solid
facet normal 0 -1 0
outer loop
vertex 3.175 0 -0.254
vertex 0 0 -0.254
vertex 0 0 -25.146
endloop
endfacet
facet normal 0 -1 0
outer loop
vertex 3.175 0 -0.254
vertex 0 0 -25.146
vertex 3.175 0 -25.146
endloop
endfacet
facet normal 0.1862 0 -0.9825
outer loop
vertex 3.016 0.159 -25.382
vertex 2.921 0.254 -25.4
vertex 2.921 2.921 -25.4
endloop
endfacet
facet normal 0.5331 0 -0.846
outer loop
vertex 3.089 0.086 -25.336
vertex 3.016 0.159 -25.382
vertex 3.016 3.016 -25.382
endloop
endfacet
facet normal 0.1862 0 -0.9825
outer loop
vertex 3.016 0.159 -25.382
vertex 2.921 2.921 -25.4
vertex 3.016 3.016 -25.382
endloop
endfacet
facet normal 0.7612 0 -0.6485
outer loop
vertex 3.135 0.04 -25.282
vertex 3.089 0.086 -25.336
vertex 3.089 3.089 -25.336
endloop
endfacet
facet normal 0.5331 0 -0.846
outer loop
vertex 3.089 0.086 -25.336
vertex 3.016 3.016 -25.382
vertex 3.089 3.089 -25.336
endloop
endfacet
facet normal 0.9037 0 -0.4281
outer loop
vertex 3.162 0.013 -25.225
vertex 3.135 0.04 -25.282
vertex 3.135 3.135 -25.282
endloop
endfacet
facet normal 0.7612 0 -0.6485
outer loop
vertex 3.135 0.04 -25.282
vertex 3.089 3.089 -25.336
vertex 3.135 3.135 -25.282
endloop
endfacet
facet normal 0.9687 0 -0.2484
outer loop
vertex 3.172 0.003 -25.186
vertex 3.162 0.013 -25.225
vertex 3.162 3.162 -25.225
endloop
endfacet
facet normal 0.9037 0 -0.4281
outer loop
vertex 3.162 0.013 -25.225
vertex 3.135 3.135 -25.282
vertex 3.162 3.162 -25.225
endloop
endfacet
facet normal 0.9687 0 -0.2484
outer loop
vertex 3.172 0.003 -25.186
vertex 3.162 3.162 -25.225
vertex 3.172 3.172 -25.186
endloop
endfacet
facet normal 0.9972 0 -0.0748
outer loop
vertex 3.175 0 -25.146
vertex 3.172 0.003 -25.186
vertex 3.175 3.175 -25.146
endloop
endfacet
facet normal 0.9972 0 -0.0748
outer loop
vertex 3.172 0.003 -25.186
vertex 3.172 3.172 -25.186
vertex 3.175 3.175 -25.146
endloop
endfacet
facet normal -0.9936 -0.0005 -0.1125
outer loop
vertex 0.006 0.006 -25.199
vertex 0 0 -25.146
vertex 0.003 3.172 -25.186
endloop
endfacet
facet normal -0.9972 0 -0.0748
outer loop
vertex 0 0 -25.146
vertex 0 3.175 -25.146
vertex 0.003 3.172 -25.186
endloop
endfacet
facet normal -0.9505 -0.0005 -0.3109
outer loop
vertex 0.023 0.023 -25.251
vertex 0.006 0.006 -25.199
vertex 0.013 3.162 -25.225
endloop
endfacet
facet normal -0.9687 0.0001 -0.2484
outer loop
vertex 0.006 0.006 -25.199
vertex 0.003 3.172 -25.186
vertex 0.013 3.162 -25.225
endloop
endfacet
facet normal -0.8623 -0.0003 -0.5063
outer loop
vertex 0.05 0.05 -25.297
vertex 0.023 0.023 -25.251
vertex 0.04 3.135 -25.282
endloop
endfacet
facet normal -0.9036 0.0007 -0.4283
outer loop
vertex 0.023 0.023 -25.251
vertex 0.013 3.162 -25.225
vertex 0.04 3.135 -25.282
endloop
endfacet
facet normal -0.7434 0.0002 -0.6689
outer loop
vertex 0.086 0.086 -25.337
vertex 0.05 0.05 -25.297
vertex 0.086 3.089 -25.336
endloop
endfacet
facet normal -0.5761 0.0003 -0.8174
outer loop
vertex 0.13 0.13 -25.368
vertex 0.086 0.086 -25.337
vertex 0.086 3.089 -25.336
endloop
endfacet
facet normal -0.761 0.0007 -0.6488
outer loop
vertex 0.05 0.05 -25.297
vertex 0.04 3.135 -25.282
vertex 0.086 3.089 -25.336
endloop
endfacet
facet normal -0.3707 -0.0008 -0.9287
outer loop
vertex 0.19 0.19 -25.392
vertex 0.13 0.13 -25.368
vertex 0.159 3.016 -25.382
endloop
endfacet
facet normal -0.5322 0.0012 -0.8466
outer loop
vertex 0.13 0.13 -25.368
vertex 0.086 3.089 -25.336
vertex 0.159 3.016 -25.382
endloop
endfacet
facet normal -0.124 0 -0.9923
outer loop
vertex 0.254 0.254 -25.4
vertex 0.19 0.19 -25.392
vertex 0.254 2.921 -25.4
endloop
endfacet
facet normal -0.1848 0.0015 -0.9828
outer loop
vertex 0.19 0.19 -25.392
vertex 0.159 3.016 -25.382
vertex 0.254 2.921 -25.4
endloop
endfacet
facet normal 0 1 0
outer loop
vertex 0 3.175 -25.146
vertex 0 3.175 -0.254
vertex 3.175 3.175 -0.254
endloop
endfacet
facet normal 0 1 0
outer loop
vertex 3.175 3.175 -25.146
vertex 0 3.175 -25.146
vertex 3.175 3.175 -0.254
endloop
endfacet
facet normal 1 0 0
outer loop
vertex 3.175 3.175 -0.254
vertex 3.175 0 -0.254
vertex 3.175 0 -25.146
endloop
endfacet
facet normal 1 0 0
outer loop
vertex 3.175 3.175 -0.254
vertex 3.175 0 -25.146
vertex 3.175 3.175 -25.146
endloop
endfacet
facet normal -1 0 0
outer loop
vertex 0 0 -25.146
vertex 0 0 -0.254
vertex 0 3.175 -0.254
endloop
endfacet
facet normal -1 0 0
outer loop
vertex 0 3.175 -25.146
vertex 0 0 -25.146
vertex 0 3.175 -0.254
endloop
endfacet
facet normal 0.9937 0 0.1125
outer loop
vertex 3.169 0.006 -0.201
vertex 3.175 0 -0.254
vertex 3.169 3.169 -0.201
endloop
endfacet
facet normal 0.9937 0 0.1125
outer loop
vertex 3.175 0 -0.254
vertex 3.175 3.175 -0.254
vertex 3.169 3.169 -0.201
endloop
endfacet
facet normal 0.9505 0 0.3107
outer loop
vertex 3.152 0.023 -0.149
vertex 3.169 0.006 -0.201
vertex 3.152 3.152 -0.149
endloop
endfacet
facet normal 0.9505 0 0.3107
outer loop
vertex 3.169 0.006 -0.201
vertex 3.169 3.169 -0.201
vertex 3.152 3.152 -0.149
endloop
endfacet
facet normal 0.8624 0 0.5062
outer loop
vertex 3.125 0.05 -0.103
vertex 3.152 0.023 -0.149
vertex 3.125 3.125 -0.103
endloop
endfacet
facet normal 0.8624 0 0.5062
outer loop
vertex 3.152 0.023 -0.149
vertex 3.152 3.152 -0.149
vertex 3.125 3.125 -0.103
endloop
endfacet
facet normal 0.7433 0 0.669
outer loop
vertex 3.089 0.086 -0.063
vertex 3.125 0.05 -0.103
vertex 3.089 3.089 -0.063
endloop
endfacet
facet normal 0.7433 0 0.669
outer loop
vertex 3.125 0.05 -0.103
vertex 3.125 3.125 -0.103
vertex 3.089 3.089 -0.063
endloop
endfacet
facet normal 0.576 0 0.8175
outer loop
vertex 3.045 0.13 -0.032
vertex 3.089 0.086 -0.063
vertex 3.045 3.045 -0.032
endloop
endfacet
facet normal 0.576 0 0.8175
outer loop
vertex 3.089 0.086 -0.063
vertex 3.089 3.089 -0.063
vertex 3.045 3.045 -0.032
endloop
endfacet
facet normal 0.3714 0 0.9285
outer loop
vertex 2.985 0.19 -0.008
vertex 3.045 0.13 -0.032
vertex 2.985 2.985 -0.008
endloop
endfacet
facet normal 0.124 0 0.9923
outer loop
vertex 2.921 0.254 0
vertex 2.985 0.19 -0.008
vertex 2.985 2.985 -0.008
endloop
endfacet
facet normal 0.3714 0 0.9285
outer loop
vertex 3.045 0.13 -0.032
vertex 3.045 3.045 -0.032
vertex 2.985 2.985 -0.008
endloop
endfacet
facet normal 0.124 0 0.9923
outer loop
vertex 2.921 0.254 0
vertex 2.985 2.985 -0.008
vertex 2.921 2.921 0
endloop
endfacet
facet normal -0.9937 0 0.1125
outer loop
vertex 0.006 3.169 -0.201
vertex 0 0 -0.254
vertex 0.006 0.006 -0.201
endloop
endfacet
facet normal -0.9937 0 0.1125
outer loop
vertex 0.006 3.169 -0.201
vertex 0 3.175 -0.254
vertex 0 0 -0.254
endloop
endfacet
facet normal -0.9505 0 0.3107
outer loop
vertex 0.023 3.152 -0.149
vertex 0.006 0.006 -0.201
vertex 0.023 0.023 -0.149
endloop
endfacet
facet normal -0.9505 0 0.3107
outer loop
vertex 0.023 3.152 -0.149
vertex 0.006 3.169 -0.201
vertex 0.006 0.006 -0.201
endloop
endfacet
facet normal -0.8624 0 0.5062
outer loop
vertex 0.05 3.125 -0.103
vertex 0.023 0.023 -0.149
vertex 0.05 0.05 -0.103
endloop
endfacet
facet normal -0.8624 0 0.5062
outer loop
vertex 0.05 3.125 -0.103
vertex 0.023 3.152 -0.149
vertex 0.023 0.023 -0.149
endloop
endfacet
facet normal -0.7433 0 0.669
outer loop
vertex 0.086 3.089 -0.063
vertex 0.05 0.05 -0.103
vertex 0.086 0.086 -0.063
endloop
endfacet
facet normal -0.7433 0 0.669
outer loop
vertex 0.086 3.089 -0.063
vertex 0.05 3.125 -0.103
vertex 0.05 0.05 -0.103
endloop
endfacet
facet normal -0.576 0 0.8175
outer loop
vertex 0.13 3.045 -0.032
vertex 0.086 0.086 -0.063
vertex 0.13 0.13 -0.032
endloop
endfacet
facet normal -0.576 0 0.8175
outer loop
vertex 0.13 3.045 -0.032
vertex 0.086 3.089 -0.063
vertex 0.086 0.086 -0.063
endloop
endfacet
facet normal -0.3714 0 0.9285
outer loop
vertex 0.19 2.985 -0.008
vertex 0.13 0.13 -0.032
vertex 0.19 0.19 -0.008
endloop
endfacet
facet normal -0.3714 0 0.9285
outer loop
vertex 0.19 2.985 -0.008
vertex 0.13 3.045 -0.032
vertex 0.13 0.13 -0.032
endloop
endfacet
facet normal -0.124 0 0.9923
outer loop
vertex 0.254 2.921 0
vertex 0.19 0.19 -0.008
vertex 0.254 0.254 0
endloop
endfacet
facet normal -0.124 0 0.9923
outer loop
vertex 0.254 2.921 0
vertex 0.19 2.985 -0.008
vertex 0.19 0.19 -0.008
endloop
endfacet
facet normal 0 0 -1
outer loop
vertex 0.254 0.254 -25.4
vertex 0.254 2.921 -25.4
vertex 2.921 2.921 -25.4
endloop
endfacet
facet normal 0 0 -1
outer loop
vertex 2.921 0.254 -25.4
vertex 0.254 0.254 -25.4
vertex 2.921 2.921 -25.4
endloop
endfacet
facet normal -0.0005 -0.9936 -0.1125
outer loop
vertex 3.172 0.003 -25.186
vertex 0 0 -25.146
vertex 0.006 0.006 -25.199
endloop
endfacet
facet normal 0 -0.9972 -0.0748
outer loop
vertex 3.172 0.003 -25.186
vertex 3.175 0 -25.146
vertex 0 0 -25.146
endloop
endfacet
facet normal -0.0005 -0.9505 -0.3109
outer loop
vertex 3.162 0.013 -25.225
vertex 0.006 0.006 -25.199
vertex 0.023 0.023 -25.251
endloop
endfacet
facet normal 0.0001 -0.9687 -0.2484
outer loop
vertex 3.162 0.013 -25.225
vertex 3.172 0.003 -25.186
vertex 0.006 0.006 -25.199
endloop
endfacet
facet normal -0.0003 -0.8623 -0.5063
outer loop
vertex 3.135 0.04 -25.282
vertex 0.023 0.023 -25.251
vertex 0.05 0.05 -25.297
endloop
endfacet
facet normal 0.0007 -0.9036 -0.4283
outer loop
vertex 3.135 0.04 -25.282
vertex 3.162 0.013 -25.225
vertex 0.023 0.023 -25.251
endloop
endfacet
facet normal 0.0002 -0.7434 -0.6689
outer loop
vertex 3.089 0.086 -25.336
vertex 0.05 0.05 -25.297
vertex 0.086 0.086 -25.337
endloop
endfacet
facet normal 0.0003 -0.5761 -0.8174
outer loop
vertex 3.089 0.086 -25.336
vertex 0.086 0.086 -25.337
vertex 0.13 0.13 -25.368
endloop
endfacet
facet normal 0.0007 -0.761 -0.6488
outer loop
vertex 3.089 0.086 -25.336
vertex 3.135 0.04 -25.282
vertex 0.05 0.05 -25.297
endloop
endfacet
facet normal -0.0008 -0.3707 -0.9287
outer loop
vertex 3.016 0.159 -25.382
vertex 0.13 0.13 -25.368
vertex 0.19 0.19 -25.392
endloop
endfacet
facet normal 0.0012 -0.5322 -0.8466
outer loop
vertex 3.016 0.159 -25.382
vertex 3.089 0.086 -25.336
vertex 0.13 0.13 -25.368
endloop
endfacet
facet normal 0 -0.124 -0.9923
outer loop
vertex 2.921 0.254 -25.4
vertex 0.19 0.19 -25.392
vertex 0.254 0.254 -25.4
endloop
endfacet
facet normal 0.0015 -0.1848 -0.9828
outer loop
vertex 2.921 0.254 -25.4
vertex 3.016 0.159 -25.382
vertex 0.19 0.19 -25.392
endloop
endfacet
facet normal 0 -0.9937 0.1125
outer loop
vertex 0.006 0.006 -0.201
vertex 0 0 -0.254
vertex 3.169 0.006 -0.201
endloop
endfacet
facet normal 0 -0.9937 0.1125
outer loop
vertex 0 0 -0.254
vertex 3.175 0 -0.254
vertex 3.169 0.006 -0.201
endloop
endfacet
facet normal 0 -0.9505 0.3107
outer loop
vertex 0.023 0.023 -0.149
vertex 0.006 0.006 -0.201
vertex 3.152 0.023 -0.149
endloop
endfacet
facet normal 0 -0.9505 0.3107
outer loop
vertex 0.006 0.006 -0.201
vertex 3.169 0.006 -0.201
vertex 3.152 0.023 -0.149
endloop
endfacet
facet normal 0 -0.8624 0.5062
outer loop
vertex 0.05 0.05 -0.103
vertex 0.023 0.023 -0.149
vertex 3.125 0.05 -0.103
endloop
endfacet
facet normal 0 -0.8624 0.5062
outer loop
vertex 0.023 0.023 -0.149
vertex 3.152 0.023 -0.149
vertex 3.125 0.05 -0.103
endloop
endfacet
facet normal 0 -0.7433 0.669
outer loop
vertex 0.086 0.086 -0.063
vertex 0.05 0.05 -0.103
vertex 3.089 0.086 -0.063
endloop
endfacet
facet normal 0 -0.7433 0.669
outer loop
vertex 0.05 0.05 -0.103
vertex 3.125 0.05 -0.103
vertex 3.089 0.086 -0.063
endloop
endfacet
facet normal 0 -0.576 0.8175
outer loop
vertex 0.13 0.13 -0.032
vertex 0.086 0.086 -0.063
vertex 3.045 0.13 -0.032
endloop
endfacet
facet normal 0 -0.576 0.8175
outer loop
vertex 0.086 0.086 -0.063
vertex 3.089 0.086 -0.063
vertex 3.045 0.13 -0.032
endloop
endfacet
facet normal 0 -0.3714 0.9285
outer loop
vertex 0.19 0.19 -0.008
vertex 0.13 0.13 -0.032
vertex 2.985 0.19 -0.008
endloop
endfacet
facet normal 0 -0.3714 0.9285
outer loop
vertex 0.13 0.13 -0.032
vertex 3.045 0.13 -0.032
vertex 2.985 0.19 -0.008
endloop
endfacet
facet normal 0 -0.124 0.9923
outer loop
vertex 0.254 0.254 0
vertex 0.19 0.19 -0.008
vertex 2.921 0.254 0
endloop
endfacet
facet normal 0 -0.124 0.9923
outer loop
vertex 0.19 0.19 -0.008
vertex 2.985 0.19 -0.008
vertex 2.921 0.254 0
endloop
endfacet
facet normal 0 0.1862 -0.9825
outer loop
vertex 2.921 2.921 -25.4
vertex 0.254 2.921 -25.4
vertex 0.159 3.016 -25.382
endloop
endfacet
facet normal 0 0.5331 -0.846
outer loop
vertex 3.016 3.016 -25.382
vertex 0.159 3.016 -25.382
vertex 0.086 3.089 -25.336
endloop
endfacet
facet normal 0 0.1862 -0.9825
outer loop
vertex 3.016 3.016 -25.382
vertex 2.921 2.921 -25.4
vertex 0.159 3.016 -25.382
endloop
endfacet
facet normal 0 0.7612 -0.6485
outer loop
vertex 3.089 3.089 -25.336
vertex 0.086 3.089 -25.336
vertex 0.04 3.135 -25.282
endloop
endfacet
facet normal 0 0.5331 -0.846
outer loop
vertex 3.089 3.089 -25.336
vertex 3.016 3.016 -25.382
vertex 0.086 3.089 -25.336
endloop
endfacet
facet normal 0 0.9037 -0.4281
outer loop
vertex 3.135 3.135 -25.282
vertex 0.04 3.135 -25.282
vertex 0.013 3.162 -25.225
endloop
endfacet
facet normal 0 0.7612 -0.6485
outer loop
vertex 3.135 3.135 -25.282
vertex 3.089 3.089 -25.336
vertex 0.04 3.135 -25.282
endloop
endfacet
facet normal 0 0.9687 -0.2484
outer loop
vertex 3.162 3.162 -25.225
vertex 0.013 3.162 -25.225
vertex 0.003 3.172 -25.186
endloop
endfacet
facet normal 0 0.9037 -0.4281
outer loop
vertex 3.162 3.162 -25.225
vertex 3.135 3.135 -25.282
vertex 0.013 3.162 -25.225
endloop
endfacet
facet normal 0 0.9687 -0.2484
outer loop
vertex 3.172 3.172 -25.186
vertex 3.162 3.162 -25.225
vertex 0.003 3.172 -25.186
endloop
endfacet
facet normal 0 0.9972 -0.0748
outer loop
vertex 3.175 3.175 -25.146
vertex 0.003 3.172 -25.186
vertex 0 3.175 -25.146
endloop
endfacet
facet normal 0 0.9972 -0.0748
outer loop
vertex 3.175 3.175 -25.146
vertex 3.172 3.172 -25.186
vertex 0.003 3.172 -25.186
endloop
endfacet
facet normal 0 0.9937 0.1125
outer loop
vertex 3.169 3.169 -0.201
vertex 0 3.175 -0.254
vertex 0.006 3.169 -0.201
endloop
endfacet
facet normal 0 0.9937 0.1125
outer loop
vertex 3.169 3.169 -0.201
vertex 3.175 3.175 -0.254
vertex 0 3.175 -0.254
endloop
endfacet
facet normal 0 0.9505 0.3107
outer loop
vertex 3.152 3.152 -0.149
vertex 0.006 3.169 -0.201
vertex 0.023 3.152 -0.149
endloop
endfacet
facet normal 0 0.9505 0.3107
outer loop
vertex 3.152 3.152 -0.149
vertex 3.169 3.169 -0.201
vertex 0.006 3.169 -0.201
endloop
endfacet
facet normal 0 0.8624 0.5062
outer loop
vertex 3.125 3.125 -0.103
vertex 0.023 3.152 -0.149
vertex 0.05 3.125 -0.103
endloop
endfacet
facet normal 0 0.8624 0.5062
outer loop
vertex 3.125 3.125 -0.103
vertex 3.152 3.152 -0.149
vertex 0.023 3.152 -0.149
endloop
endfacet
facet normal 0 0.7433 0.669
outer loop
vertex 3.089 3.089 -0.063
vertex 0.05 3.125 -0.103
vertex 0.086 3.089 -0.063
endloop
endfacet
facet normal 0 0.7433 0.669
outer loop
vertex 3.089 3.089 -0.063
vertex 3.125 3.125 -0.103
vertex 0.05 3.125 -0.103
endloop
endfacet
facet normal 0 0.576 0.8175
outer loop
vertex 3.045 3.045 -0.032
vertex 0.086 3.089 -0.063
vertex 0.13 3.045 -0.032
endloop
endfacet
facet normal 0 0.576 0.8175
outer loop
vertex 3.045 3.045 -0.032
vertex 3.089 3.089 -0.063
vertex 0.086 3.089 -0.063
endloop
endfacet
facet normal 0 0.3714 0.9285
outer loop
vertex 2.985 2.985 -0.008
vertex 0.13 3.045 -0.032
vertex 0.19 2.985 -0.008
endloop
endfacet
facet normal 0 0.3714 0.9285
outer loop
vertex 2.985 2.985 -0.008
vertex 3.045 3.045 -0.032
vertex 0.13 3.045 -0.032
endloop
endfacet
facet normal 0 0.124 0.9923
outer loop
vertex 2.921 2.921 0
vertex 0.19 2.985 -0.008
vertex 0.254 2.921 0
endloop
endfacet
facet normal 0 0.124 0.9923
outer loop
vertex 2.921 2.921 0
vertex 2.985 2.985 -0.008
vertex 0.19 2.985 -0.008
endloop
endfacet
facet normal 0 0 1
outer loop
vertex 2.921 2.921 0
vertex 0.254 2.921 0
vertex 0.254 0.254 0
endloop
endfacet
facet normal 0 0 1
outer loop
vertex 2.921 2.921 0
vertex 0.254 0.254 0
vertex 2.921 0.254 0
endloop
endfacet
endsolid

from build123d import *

# Parameters (mm, degrees)
SKETCH1_W           = 3.175
SKETCH1_H           = 3.175
BOSS_EXTRUDE1_DEPTH = 25.4
FILLET1_R           = 0.254
FILLET2_R           = 0.254


with BuildPart() as part:
    # Sketch1 → Boss-Extrude1 (new body)
    with BuildSketch(Plane.XY):
        with Locations((1.5875, 1.5875)):
            Rectangle(SKETCH1_W, SKETCH1_H)
    extrude(amount=-BOSS_EXTRUDE1_DEPTH)

    # Fillet1
    fillet1_edges = [part.edges().sort_by_distance(p)[0] for p in [
        (1.5875, 3.175, 0),
        (3.175, 1.5875, 0),
        (1.5875, 0, 0),
        (0, 1.5875, 0),
    ]]
    fillet(fillet1_edges, radius=FILLET1_R)

    # Fillet2
    fillet2_edges = [part.edges().sort_by_distance(p)[0] for p in [
        (3.175, 1.5875, -25.4),
        (1.5875, 3.175, -25.4),
        (0, 1.5875, -25.4),
        (1.5875, 0, -25.4),
    ]]
    fillet(fillet2_edges, radius=FILLET2_R)


solid = part.part
